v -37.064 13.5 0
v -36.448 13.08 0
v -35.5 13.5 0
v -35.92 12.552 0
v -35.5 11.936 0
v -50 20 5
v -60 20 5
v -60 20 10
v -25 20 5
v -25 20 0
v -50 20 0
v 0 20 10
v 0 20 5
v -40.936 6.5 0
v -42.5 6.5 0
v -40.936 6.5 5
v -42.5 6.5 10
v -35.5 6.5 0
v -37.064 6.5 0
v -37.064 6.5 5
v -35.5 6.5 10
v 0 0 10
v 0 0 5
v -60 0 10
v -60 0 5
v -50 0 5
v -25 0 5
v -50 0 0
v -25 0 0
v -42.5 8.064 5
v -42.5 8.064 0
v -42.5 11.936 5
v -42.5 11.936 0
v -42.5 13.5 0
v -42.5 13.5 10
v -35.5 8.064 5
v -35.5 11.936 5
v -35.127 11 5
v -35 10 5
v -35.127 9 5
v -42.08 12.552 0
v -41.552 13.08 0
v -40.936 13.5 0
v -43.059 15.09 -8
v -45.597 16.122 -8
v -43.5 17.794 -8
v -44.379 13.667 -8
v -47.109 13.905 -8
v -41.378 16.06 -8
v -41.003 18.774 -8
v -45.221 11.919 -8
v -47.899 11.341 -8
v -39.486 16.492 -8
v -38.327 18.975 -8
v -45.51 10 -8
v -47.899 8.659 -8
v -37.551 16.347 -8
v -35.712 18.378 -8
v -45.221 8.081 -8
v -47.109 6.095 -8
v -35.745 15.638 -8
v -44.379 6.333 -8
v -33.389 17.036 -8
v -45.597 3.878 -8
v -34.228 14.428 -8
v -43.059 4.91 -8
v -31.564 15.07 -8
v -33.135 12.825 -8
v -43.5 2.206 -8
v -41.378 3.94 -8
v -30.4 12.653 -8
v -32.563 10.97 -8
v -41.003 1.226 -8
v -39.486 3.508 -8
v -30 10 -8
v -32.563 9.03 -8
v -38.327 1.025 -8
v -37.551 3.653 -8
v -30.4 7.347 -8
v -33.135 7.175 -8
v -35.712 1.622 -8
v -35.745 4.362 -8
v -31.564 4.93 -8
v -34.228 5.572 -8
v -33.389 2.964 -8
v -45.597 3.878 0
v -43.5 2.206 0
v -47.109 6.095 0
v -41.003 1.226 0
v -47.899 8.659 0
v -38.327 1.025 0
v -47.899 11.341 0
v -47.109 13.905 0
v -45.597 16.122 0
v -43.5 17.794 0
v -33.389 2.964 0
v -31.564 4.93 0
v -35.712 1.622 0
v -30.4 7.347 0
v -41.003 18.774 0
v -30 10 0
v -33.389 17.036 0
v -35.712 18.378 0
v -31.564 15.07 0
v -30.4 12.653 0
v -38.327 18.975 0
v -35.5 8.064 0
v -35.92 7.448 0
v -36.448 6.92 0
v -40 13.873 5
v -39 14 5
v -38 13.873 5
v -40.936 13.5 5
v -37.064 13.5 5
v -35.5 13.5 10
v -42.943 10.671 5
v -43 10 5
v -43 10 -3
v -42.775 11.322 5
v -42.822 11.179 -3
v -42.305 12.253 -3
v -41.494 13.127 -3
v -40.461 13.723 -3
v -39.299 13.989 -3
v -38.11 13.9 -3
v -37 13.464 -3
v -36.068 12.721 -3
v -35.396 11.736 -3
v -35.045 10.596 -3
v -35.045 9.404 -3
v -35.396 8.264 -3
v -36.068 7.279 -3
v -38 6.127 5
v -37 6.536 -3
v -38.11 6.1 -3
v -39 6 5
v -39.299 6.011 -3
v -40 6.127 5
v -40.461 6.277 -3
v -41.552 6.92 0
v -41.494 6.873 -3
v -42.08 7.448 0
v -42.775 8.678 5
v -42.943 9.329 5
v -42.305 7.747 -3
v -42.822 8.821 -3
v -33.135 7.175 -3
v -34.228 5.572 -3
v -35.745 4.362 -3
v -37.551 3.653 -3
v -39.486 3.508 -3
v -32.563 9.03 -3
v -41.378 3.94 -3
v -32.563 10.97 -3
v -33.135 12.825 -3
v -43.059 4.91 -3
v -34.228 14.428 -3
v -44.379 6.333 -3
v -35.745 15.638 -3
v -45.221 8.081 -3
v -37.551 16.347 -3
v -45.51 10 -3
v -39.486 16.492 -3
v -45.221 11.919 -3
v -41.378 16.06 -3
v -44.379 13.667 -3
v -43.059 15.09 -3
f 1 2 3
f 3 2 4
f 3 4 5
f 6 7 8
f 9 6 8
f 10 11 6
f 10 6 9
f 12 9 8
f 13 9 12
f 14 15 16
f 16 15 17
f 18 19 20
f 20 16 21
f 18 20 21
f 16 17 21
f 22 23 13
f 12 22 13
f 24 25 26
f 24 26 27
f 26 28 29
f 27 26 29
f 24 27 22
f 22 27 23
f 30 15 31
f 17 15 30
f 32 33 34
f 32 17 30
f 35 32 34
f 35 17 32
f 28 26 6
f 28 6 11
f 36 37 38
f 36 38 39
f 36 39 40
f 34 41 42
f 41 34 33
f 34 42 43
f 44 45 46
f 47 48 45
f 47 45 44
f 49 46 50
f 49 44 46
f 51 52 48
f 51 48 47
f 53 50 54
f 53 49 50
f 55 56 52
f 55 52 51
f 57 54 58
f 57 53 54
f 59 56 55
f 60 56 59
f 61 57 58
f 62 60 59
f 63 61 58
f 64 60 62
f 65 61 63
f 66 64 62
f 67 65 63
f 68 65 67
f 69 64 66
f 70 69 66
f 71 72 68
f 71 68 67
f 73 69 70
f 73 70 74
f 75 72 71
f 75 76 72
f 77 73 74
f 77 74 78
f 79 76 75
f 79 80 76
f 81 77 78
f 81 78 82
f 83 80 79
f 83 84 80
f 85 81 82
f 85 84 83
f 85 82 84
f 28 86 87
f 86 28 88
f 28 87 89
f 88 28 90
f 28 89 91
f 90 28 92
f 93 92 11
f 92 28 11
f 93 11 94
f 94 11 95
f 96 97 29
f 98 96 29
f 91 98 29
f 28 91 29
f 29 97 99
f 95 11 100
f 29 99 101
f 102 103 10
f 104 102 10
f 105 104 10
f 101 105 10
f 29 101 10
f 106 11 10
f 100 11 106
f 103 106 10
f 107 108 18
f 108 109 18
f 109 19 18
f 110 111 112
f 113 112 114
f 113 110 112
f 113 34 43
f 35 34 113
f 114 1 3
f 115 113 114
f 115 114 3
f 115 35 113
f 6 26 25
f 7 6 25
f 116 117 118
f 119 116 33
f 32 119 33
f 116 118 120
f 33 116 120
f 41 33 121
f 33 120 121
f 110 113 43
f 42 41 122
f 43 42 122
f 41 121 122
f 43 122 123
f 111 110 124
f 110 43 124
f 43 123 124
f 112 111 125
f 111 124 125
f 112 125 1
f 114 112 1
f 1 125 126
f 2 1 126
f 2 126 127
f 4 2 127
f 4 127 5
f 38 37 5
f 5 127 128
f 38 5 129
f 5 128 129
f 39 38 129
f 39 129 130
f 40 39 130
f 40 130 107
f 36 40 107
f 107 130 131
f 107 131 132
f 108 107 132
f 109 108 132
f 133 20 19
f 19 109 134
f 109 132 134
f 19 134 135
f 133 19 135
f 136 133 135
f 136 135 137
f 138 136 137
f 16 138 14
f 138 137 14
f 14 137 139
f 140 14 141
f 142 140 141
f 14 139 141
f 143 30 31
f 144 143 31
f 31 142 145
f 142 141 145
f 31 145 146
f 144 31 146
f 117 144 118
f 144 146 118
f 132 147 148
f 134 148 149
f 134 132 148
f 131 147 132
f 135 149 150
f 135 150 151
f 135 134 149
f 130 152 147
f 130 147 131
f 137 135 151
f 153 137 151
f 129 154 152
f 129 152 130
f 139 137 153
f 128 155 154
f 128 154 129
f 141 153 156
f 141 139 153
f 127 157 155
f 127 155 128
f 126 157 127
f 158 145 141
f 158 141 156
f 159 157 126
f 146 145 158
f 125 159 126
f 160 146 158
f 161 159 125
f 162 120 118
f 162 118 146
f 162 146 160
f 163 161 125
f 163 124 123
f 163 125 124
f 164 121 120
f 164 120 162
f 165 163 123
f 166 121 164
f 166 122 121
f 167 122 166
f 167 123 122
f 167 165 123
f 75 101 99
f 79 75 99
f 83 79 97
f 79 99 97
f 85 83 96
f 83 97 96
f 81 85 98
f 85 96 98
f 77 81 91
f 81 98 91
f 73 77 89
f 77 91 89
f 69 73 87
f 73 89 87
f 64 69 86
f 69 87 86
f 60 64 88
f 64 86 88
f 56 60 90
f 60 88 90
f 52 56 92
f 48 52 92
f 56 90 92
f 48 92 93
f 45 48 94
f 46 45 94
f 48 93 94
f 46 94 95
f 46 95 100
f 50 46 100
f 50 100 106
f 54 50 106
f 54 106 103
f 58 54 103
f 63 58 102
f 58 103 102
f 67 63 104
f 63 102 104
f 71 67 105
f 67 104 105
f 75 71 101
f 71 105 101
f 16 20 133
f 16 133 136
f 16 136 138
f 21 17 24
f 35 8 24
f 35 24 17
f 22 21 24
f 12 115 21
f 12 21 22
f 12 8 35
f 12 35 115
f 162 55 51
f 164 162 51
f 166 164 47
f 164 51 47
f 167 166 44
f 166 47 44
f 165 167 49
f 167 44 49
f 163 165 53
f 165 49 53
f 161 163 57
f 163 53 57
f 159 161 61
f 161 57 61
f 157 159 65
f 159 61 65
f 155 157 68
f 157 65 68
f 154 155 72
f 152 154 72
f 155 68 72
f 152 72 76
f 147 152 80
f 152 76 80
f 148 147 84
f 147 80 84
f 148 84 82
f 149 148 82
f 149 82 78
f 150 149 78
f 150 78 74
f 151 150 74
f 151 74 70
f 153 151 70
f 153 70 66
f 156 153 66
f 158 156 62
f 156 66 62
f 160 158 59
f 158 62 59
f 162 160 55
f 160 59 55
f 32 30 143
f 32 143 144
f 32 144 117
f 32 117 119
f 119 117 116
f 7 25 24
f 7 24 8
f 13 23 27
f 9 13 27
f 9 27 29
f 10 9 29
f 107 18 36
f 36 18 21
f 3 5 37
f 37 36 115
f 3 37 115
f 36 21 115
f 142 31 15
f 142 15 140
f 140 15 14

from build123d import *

# Parameters (mm, degrees)
SKETCH1_W           = 60
SKETCH1_H           = 20
BOSS_EXTRUDE1_DEPTH = 10
SKETCH2_W           = 7
SKETCH2_H           = 7
CUT_EXTRUDE1_DEPTH  = 10
SKETCH3_W           = 25
SKETCH3_H           = 5
SKETCH3_W_2         = 10
CUT_EXTRUDE2_DEPTH  = 65.031242374
SKETCH5_R           = 9
BOSS_EXTRUDE2_DEPTH = 8
SKETCH6_R           = 6.51
CUT_EXTRUDE3_DEPTH  = 5
SKETCH7_R           = 4
CUT_EXTRUDE4_DEPTH  = 8


with BuildPart() as part:
    # Sketch1 → Boss-Extrude1 (new body)
    with BuildSketch(Plane.XY):
        with Locations((-30, 10)):
            Rectangle(SKETCH1_W, SKETCH1_H)
    extrude(amount=BOSS_EXTRUDE1_DEPTH)

    # Sketch2 → Cut-Extrude1 (cut)
    with BuildSketch(Plane.XY.offset(10)):
        with Locations((-39, 10)):
            Rectangle(SKETCH2_W, SKETCH2_H)
    extrude(amount=-CUT_EXTRUDE1_DEPTH, mode=Mode.SUBTRACT)

    # Sketch3 → Cut-Extrude2 (cut, through all)
    with BuildSketch(Plane(origin=(0, 0, 0), x_dir=(-1, 0, 0), z_dir=(0, -1, 0))):
        with Locations((12.5, -2.5)):
            Rectangle(SKETCH3_W, SKETCH3_H)
        with Locations((55, -2.5)):
            Rectangle(SKETCH3_W_2, SKETCH3_H)
    extrude(amount=-CUT_EXTRUDE2_DEPTH, mode=Mode.SUBTRACT)

    # Sketch5 → Boss-Extrude2 (add)
    with BuildSketch(Plane(origin=(0, 0, 0), x_dir=(-1, 0, 0), z_dir=(0, 0, -1))):
        with Locations(Location((39, 10, 0), (0, 0, 180))):
            Circle(SKETCH5_R)
    extrude(amount=BOSS_EXTRUDE2_DEPTH)

    # Sketch6 → Cut-Extrude3 (cut)
    with BuildSketch(Plane(origin=(0, 0, -8), x_dir=(-1, 0, 0), z_dir=(0, 0, -1))):
        with Locations((39, 10)):
            Circle(SKETCH6_R)
    extrude(amount=-CUT_EXTRUDE3_DEPTH, mode=Mode.SUBTRACT)

    # Sketch7 → Cut-Extrude4 (cut)
    with BuildSketch(Plane(origin=(0, 0, -3), x_dir=(-1, 0, 0), z_dir=(0, 0, -1))):
        with Locations((39, 10)):
            Circle(SKETCH7_R)
    extrude(amount=-CUT_EXTRUDE4_DEPTH, mode=Mode.SUBTRACT)


solid = part.part
